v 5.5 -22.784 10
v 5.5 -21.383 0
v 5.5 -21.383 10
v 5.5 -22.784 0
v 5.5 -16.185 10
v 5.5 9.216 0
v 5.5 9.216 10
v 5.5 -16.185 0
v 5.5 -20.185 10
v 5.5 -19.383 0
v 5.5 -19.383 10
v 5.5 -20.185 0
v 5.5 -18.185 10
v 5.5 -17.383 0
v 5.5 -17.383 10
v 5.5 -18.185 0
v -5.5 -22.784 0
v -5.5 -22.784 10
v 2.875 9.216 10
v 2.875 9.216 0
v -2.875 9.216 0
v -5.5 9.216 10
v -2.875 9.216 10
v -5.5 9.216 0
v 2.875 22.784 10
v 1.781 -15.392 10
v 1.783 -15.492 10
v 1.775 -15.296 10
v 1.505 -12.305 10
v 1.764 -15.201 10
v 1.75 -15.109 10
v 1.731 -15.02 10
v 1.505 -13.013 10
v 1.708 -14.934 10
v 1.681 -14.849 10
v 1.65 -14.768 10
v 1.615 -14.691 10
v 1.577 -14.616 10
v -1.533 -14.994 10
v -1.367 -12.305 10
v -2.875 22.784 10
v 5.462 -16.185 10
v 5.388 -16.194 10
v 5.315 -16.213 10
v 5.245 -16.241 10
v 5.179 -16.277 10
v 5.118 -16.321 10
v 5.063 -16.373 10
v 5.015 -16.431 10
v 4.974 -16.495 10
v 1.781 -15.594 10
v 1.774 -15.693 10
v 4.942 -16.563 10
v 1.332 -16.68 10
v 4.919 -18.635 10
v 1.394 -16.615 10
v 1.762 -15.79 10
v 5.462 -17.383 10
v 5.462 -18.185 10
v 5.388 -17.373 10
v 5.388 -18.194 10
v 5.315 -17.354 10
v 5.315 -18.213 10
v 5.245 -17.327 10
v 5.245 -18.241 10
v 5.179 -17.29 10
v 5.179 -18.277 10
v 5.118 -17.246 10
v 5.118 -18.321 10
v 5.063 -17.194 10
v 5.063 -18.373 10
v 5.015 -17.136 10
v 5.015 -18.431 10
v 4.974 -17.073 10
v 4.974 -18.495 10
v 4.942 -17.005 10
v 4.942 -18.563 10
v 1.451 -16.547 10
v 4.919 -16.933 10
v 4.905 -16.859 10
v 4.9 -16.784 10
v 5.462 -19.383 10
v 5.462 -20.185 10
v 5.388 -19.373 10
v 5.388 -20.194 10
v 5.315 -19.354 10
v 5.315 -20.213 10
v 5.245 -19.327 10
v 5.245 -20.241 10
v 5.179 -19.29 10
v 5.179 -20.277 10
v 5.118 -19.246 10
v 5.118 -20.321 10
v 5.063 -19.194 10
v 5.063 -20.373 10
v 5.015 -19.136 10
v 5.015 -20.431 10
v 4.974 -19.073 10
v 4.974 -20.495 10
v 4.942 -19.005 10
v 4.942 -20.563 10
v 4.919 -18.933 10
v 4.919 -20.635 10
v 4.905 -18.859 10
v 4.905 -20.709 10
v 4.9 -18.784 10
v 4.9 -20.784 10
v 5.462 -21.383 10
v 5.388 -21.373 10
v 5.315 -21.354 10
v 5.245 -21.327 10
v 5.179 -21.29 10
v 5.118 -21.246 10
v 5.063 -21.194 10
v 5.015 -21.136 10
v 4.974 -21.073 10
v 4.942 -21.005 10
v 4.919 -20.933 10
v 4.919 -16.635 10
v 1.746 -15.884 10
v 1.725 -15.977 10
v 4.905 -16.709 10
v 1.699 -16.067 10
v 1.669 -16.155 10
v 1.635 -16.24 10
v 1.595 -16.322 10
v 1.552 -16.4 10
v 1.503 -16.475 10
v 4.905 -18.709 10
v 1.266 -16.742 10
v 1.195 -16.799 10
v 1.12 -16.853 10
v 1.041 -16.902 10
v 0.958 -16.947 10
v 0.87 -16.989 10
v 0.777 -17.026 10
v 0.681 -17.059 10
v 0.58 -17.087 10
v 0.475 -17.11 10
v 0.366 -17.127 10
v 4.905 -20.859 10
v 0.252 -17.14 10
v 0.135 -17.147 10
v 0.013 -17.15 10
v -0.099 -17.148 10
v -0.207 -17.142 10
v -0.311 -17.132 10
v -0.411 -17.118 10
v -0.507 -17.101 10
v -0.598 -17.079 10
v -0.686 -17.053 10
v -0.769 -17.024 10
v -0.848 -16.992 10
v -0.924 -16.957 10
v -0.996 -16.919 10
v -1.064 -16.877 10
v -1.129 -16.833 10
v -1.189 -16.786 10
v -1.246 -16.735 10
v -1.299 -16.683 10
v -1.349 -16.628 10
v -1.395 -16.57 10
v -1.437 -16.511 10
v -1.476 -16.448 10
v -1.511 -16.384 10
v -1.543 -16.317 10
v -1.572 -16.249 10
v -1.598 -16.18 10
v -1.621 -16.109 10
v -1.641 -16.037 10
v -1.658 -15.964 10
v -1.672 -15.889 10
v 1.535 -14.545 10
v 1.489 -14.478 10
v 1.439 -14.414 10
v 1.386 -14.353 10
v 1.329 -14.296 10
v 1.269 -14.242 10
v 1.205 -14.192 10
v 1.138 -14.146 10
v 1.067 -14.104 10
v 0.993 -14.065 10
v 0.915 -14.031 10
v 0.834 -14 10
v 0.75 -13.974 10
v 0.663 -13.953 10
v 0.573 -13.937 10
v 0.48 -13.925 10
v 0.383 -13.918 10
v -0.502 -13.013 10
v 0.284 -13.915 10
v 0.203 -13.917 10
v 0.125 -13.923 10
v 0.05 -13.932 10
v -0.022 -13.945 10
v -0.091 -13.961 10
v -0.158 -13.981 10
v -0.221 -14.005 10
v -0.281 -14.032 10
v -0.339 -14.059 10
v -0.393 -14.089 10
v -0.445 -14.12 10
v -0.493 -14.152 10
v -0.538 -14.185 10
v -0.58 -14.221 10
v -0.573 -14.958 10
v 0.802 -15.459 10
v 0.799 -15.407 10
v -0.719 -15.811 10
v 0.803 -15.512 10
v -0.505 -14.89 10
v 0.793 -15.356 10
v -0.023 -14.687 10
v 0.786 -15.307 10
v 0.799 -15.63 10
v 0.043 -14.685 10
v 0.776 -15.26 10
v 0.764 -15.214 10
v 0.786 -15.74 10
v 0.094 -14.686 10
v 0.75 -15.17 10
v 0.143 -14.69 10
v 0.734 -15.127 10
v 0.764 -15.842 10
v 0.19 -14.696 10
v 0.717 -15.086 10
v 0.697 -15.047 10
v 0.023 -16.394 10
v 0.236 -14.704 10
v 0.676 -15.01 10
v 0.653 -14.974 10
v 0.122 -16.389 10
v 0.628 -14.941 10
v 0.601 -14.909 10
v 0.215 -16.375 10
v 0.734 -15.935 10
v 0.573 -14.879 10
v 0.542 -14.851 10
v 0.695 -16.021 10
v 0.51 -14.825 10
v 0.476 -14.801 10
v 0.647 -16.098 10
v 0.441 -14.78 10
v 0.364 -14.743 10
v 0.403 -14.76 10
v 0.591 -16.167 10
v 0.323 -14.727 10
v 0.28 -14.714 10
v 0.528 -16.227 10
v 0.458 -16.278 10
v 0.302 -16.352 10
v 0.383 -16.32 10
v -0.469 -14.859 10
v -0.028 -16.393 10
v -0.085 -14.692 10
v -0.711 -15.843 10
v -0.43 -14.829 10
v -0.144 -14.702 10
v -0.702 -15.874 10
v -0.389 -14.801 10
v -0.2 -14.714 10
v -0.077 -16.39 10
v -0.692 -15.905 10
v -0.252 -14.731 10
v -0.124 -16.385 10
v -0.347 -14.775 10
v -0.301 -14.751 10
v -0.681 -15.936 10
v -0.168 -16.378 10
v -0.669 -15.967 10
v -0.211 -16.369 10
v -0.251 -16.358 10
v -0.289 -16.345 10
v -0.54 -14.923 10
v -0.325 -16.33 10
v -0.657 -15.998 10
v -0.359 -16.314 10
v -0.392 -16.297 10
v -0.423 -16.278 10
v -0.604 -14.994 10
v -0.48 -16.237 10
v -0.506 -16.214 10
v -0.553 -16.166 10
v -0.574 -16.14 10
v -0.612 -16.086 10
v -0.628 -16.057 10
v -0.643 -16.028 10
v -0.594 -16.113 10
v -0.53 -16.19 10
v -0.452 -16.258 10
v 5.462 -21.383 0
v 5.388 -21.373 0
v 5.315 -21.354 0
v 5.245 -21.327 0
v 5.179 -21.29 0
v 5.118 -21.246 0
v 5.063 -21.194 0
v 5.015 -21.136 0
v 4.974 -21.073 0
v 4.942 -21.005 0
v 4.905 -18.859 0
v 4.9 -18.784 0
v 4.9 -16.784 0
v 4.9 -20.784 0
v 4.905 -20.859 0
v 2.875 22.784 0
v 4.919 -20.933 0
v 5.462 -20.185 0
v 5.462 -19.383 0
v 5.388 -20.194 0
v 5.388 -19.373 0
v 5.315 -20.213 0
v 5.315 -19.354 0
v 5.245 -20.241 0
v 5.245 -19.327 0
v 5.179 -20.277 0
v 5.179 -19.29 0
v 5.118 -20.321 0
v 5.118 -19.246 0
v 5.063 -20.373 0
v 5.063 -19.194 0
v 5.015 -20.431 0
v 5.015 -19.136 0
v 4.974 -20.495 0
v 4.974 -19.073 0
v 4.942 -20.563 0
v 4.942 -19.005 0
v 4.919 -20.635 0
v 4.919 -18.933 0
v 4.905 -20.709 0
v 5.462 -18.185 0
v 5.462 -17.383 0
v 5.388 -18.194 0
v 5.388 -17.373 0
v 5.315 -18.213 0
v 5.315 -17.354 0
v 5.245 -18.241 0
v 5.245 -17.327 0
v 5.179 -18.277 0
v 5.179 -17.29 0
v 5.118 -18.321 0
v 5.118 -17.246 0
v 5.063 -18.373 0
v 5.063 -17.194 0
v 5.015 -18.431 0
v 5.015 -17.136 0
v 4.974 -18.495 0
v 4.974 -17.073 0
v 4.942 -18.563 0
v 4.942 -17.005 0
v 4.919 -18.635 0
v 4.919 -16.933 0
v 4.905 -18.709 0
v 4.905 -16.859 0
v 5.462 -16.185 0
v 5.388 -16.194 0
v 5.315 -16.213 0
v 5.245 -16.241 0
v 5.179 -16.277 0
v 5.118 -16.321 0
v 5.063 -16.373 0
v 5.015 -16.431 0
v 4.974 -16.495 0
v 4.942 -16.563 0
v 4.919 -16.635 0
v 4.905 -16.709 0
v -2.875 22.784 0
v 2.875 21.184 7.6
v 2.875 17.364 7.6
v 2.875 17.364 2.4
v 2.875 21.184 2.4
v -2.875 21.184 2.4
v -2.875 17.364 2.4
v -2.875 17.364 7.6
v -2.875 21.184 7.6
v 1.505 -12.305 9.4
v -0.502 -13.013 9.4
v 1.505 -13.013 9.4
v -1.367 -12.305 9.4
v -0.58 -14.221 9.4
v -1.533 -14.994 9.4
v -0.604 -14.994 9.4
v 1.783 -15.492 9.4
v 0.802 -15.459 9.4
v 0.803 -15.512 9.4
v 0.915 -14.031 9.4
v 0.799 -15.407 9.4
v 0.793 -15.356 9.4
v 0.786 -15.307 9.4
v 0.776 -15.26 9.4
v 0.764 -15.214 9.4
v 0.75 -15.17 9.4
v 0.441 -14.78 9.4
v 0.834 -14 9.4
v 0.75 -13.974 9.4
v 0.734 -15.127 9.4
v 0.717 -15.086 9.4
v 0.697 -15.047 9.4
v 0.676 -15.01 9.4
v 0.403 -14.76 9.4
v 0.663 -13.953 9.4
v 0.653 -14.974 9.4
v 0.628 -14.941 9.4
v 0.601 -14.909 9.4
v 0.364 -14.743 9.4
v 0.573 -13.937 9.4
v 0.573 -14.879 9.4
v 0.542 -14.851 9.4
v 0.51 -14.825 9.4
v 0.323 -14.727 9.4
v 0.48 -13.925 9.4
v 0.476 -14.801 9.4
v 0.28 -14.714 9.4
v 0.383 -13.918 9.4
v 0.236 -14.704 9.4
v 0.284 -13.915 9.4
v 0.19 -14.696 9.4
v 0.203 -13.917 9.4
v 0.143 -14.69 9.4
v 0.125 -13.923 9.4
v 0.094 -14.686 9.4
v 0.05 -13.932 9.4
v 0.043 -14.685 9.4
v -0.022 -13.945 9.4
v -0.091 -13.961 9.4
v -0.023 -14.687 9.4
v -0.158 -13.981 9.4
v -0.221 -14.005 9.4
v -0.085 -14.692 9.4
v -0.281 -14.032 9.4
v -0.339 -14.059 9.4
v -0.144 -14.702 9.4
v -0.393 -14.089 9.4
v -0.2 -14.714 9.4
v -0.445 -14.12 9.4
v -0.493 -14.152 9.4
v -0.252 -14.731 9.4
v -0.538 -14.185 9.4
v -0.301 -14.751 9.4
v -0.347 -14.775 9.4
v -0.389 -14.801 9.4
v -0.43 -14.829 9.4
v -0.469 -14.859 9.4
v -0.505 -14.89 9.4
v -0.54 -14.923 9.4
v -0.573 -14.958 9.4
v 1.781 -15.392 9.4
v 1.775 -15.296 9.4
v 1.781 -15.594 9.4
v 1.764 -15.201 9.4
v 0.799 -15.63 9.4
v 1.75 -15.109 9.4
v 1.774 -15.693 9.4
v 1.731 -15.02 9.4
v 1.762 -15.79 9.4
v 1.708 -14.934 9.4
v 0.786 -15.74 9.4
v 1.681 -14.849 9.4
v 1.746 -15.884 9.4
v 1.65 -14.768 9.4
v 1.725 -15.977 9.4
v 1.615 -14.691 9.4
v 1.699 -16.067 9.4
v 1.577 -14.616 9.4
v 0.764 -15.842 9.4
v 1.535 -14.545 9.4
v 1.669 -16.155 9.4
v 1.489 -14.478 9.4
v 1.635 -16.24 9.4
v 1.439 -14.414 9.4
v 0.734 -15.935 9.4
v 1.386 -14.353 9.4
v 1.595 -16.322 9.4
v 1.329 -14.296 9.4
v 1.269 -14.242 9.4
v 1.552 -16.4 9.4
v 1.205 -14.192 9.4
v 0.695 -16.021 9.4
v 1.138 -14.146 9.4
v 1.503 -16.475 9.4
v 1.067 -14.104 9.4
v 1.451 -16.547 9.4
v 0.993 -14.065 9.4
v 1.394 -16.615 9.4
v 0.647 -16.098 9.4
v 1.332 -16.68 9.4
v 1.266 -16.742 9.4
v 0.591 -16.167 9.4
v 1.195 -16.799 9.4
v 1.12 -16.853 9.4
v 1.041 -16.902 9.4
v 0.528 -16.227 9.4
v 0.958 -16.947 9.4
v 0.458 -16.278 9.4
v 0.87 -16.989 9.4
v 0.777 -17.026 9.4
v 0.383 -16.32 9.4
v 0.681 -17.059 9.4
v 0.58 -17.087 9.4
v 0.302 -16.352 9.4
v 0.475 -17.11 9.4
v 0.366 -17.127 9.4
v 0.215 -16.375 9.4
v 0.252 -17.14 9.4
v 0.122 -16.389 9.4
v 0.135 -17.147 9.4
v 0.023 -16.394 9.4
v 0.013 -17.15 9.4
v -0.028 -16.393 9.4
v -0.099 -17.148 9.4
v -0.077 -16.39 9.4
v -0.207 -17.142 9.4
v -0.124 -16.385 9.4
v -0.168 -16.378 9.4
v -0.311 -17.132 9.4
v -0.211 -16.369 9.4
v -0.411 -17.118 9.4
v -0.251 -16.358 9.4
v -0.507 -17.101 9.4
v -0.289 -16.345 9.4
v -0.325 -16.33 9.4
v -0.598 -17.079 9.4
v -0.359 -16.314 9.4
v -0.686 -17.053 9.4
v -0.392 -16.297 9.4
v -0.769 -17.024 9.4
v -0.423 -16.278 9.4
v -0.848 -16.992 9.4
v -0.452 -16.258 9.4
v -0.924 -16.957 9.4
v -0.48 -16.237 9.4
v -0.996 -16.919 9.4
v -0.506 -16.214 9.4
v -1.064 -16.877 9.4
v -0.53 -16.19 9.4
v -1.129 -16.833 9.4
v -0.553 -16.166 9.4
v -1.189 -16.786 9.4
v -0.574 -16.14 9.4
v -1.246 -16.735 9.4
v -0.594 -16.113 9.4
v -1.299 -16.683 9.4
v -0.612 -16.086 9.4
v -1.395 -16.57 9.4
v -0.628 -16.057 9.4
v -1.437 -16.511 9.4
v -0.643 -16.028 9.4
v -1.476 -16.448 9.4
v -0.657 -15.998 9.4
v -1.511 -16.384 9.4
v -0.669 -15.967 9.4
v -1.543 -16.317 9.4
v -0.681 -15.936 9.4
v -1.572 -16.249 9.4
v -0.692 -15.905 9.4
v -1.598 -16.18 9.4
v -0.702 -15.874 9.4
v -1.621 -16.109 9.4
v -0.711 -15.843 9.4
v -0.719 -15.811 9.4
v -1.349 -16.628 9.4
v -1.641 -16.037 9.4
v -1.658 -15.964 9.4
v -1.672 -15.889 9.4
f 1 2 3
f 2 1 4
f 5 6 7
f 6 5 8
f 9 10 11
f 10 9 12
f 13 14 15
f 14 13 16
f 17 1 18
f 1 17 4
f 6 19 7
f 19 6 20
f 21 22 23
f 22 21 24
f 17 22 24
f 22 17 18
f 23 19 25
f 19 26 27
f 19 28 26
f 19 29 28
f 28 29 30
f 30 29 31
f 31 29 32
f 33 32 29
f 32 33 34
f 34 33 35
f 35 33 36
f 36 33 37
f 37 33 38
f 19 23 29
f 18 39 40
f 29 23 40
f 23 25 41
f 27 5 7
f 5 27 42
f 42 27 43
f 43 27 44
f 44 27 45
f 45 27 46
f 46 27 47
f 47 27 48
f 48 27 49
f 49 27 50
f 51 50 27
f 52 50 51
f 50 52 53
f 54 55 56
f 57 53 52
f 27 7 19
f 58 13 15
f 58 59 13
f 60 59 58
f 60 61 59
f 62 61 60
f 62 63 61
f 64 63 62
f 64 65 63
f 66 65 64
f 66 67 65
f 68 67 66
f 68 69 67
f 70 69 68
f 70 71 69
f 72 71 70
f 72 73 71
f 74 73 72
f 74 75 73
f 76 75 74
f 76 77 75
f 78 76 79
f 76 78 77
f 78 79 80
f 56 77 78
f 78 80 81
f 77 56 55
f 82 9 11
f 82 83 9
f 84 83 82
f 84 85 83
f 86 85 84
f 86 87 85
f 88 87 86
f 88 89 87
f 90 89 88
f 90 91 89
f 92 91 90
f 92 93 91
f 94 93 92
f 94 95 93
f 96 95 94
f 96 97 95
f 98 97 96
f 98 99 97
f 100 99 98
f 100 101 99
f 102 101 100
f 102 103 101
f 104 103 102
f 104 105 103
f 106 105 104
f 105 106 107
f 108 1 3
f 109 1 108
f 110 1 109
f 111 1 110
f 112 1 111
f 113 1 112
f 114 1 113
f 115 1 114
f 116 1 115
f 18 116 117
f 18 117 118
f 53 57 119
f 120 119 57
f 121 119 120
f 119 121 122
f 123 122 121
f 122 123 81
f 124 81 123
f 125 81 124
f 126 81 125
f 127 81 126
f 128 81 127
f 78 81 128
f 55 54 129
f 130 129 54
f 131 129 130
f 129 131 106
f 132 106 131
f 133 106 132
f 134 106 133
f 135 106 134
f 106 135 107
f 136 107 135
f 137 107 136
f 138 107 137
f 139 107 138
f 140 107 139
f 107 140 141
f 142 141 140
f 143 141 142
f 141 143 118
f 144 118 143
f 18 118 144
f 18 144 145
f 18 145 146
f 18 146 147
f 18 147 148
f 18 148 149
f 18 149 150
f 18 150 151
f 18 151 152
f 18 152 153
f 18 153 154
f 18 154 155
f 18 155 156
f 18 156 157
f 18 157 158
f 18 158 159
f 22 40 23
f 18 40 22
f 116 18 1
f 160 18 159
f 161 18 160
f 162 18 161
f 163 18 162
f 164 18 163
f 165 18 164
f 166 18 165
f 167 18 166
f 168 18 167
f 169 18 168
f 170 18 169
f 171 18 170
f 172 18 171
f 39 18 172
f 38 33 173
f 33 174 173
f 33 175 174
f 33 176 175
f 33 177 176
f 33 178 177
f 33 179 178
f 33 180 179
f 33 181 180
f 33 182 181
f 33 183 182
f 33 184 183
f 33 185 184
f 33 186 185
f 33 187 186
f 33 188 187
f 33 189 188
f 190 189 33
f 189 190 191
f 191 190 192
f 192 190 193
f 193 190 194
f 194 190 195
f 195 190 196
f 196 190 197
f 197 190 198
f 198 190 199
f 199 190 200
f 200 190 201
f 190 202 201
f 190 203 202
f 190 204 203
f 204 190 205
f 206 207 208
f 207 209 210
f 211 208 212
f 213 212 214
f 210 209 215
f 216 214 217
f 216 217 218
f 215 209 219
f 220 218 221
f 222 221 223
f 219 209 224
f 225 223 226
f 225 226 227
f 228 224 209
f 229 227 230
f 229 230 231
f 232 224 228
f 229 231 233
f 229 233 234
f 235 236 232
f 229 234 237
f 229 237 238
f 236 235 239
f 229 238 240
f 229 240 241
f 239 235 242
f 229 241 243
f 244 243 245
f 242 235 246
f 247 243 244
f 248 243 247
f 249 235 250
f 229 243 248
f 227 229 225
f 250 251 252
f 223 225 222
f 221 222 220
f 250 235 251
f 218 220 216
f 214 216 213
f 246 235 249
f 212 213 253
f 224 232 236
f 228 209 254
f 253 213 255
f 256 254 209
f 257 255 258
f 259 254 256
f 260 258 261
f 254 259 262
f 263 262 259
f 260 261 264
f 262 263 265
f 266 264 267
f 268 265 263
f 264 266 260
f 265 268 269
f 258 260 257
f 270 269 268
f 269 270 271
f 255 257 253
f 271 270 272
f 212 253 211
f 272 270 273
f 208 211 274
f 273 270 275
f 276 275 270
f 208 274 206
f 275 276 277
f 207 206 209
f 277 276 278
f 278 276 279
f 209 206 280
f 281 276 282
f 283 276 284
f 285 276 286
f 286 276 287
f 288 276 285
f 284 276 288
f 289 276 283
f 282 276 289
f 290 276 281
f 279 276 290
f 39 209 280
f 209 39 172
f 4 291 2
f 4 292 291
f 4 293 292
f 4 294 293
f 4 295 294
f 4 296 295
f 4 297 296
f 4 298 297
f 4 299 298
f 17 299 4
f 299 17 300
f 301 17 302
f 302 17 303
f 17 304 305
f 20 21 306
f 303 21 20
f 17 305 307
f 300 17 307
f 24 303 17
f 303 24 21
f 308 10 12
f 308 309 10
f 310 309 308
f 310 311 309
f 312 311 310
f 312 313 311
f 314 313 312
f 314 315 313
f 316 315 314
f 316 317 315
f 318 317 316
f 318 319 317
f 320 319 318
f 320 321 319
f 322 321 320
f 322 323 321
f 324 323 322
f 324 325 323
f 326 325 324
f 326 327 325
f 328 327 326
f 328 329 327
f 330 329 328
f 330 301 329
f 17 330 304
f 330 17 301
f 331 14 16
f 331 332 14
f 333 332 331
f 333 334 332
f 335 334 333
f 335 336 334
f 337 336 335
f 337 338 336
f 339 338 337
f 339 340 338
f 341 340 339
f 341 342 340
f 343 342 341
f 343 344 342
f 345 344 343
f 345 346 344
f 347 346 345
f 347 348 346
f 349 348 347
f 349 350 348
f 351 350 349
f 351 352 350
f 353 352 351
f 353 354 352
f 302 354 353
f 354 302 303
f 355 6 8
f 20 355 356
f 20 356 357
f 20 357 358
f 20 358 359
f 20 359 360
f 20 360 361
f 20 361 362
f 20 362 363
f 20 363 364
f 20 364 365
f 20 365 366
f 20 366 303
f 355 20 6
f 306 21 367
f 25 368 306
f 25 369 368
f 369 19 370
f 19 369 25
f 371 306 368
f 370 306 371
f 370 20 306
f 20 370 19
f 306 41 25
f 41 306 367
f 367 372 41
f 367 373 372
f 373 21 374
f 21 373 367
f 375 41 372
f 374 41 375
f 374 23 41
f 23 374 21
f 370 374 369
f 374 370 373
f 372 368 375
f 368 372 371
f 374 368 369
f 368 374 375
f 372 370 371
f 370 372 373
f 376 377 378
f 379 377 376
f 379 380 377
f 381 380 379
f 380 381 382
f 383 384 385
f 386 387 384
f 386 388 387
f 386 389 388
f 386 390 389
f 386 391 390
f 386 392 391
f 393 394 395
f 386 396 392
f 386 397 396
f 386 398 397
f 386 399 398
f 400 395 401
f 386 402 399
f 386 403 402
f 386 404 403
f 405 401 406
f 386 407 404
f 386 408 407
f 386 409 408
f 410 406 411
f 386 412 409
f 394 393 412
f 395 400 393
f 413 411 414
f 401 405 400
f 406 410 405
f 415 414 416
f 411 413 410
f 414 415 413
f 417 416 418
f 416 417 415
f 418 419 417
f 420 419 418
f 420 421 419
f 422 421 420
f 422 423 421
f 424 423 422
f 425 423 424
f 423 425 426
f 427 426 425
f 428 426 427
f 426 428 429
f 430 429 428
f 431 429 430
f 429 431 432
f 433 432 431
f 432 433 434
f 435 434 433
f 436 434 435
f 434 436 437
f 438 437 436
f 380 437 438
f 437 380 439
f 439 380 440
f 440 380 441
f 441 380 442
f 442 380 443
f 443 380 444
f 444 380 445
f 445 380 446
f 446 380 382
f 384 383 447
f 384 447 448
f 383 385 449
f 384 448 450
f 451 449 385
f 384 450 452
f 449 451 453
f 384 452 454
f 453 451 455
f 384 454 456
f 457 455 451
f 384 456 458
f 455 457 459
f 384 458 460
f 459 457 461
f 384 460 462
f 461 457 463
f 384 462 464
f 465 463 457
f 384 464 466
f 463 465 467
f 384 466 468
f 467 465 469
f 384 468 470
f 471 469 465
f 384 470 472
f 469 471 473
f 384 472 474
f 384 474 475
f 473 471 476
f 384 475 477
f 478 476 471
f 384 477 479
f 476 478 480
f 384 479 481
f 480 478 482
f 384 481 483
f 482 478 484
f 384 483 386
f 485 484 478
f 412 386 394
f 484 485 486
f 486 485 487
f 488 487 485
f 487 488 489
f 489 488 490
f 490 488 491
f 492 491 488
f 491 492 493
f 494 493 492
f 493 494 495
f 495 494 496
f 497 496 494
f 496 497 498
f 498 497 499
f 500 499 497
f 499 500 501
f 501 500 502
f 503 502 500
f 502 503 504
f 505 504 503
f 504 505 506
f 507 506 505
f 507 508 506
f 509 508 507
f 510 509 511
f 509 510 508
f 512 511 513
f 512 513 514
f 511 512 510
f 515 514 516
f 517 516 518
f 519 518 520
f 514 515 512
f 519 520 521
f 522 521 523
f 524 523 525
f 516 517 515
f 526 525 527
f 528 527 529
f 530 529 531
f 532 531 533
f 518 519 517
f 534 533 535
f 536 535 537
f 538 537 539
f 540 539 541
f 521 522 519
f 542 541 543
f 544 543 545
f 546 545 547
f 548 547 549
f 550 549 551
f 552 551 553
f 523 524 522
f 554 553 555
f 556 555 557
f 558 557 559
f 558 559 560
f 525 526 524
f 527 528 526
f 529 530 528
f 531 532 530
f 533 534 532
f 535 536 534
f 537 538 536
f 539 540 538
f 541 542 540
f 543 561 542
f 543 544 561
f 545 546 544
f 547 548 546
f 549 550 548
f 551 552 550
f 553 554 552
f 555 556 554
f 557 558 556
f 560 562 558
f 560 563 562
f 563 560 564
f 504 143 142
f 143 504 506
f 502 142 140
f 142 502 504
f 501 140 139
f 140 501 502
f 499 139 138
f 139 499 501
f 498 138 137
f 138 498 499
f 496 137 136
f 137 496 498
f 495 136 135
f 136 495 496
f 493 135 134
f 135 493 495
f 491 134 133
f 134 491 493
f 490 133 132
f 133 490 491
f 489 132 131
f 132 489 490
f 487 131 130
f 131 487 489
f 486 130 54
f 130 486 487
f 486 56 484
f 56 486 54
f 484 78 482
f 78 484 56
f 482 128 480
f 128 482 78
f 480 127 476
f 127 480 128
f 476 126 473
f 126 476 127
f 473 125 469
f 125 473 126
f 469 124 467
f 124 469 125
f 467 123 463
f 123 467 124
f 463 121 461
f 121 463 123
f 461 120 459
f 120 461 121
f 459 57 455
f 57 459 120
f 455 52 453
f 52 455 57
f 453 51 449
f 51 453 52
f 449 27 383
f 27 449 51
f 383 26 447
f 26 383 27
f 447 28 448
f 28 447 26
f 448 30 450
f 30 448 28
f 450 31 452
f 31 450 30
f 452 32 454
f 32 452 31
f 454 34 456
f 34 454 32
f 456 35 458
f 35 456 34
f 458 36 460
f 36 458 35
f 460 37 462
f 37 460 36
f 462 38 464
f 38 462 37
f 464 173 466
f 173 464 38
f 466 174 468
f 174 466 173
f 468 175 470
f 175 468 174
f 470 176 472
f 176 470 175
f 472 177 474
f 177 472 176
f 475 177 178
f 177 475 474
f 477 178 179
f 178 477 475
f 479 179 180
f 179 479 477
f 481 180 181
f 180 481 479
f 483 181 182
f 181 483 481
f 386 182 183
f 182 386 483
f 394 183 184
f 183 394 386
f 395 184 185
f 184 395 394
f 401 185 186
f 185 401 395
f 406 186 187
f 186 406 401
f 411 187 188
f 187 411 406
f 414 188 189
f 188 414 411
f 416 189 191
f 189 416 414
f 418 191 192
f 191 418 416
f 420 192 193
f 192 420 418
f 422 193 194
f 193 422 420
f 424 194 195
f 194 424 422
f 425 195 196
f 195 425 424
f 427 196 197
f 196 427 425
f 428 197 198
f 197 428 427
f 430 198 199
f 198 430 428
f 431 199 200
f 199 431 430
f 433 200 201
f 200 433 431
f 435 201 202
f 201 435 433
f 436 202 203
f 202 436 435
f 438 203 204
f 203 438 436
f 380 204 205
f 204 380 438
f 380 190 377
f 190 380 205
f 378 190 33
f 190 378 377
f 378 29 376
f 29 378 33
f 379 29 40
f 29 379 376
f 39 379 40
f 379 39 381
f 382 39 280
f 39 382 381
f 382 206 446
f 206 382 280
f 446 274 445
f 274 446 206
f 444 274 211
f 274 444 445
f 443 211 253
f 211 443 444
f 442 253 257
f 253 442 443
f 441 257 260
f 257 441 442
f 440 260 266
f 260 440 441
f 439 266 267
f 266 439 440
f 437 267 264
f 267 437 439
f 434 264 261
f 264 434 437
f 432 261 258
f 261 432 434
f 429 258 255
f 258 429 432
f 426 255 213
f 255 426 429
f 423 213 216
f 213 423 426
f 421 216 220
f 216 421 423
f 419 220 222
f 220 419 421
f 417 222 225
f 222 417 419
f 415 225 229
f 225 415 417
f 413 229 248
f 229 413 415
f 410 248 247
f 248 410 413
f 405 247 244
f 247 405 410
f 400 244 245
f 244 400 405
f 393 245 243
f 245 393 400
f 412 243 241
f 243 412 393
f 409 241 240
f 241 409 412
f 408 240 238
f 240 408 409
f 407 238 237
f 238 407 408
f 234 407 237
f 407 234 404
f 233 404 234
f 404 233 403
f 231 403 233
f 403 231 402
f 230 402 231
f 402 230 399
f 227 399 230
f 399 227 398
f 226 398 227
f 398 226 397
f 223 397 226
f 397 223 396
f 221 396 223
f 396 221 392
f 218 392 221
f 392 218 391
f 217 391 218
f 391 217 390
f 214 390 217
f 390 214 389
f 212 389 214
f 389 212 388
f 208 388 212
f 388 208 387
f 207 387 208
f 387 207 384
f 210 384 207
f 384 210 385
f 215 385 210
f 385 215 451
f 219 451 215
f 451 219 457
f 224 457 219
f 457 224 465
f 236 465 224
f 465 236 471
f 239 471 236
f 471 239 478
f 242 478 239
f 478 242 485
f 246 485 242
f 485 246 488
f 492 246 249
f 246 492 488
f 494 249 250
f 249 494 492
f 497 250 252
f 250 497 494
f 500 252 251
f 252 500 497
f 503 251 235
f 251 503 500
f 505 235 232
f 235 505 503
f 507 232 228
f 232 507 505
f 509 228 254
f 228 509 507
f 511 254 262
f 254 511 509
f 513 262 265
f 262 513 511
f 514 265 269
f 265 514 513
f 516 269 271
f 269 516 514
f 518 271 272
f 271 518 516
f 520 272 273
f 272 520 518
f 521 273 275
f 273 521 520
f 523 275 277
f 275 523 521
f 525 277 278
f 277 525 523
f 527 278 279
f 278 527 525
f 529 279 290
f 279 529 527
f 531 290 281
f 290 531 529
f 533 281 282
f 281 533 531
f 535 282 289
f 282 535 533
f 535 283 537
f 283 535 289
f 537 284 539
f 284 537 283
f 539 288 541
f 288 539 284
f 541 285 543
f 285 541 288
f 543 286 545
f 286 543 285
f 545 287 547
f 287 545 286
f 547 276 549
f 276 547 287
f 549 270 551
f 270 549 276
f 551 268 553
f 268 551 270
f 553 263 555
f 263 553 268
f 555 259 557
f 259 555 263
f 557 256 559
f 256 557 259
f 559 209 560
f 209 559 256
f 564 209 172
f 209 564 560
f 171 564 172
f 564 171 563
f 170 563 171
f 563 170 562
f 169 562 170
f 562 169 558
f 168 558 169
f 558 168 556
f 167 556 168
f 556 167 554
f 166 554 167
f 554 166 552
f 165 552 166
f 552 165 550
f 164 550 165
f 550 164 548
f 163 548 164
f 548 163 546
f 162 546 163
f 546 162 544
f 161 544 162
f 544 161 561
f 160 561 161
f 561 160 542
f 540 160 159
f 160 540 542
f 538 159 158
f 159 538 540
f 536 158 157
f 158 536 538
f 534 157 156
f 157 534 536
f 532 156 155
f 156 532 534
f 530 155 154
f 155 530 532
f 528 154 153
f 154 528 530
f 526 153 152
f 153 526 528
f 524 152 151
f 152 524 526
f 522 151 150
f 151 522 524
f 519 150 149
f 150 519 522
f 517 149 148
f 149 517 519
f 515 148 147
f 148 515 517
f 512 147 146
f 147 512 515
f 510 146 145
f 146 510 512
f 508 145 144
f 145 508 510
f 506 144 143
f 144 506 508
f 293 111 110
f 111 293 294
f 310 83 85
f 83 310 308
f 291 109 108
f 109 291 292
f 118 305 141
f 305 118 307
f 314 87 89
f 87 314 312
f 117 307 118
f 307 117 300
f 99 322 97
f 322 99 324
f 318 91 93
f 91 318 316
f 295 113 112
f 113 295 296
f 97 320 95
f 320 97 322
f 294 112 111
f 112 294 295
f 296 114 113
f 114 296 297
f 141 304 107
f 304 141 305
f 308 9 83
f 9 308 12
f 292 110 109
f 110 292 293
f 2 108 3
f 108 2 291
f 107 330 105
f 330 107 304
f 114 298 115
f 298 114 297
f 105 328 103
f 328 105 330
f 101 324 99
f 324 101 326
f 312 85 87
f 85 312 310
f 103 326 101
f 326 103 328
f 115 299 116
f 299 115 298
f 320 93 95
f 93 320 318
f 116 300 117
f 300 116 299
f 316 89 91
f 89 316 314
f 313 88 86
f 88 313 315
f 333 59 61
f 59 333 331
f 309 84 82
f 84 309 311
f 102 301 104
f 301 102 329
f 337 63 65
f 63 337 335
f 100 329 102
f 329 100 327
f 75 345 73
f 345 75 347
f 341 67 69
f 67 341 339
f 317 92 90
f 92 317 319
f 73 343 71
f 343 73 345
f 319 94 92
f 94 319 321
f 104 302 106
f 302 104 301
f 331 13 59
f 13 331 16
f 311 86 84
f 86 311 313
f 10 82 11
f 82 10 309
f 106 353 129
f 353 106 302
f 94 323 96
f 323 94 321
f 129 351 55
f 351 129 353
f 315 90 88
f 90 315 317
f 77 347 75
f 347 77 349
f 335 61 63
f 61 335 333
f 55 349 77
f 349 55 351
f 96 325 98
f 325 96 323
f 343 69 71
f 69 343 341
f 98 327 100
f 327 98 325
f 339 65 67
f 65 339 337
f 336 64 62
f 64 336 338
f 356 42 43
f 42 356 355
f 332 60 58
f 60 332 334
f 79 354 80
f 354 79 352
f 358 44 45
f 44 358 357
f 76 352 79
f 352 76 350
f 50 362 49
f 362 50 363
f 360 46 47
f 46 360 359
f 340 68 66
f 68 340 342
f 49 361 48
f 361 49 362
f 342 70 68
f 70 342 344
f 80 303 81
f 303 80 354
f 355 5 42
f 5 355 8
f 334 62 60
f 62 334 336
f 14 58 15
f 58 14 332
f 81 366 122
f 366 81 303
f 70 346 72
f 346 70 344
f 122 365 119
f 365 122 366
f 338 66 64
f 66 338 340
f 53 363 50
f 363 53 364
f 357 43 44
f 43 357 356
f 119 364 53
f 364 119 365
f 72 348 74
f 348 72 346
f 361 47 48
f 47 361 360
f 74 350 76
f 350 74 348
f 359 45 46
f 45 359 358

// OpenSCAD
$fn = 50;

difference() {
	union() {
		translate(v = [0, 9.21625, 0]) {
			rotate(a = [90, 0, 0]) {
				difference() {
					union() {
						translate(v = [-5.5, 0, 0]) {
							cube(size = [11.0, 10.0, 32.0]);
						}
						translate(v = [-2.875, 0, -13.567499999999999]) {
							cube(size = [5.75, 10.0, 13.667499999999999]);
						}
					}
					union() {
						translate(v = [-2.975, 2.4000000000000004, -11.9675]) {
							cube(size = [5.95, 5.199999999999999, 3.8200000000000003]);
						}
						translate(v = [0, 9.4, 24.0]) {
							rotate(a = [-90, 0, 0]) {
								linear_extrude(height = 0.7) {
									text(font = "Arial:style=Bold", halign = "center", size = 5.0, text = "5", valign = "center");
								}
							}
						}
						translate(v = [5.5, 10.1, 30.0]) {
							rotate(a = [90, 0, 0]) {
								cylinder(h = 10.2, r = 0.6);
							}
						}
						translate(v = [5.5, 10.1, 28.0]) {
							rotate(a = [90, 0, 0]) {
								cylinder(h = 10.2, r = 0.6);
							}
						}
						translate(v = [5.5, 10.1, 26.0]) {
							rotate(a = [90, 0, 0]) {
								cylinder(h = 10.2, r = 0.6);
							}
						}
					}
				}
			}
		}
	}
	union();
}
